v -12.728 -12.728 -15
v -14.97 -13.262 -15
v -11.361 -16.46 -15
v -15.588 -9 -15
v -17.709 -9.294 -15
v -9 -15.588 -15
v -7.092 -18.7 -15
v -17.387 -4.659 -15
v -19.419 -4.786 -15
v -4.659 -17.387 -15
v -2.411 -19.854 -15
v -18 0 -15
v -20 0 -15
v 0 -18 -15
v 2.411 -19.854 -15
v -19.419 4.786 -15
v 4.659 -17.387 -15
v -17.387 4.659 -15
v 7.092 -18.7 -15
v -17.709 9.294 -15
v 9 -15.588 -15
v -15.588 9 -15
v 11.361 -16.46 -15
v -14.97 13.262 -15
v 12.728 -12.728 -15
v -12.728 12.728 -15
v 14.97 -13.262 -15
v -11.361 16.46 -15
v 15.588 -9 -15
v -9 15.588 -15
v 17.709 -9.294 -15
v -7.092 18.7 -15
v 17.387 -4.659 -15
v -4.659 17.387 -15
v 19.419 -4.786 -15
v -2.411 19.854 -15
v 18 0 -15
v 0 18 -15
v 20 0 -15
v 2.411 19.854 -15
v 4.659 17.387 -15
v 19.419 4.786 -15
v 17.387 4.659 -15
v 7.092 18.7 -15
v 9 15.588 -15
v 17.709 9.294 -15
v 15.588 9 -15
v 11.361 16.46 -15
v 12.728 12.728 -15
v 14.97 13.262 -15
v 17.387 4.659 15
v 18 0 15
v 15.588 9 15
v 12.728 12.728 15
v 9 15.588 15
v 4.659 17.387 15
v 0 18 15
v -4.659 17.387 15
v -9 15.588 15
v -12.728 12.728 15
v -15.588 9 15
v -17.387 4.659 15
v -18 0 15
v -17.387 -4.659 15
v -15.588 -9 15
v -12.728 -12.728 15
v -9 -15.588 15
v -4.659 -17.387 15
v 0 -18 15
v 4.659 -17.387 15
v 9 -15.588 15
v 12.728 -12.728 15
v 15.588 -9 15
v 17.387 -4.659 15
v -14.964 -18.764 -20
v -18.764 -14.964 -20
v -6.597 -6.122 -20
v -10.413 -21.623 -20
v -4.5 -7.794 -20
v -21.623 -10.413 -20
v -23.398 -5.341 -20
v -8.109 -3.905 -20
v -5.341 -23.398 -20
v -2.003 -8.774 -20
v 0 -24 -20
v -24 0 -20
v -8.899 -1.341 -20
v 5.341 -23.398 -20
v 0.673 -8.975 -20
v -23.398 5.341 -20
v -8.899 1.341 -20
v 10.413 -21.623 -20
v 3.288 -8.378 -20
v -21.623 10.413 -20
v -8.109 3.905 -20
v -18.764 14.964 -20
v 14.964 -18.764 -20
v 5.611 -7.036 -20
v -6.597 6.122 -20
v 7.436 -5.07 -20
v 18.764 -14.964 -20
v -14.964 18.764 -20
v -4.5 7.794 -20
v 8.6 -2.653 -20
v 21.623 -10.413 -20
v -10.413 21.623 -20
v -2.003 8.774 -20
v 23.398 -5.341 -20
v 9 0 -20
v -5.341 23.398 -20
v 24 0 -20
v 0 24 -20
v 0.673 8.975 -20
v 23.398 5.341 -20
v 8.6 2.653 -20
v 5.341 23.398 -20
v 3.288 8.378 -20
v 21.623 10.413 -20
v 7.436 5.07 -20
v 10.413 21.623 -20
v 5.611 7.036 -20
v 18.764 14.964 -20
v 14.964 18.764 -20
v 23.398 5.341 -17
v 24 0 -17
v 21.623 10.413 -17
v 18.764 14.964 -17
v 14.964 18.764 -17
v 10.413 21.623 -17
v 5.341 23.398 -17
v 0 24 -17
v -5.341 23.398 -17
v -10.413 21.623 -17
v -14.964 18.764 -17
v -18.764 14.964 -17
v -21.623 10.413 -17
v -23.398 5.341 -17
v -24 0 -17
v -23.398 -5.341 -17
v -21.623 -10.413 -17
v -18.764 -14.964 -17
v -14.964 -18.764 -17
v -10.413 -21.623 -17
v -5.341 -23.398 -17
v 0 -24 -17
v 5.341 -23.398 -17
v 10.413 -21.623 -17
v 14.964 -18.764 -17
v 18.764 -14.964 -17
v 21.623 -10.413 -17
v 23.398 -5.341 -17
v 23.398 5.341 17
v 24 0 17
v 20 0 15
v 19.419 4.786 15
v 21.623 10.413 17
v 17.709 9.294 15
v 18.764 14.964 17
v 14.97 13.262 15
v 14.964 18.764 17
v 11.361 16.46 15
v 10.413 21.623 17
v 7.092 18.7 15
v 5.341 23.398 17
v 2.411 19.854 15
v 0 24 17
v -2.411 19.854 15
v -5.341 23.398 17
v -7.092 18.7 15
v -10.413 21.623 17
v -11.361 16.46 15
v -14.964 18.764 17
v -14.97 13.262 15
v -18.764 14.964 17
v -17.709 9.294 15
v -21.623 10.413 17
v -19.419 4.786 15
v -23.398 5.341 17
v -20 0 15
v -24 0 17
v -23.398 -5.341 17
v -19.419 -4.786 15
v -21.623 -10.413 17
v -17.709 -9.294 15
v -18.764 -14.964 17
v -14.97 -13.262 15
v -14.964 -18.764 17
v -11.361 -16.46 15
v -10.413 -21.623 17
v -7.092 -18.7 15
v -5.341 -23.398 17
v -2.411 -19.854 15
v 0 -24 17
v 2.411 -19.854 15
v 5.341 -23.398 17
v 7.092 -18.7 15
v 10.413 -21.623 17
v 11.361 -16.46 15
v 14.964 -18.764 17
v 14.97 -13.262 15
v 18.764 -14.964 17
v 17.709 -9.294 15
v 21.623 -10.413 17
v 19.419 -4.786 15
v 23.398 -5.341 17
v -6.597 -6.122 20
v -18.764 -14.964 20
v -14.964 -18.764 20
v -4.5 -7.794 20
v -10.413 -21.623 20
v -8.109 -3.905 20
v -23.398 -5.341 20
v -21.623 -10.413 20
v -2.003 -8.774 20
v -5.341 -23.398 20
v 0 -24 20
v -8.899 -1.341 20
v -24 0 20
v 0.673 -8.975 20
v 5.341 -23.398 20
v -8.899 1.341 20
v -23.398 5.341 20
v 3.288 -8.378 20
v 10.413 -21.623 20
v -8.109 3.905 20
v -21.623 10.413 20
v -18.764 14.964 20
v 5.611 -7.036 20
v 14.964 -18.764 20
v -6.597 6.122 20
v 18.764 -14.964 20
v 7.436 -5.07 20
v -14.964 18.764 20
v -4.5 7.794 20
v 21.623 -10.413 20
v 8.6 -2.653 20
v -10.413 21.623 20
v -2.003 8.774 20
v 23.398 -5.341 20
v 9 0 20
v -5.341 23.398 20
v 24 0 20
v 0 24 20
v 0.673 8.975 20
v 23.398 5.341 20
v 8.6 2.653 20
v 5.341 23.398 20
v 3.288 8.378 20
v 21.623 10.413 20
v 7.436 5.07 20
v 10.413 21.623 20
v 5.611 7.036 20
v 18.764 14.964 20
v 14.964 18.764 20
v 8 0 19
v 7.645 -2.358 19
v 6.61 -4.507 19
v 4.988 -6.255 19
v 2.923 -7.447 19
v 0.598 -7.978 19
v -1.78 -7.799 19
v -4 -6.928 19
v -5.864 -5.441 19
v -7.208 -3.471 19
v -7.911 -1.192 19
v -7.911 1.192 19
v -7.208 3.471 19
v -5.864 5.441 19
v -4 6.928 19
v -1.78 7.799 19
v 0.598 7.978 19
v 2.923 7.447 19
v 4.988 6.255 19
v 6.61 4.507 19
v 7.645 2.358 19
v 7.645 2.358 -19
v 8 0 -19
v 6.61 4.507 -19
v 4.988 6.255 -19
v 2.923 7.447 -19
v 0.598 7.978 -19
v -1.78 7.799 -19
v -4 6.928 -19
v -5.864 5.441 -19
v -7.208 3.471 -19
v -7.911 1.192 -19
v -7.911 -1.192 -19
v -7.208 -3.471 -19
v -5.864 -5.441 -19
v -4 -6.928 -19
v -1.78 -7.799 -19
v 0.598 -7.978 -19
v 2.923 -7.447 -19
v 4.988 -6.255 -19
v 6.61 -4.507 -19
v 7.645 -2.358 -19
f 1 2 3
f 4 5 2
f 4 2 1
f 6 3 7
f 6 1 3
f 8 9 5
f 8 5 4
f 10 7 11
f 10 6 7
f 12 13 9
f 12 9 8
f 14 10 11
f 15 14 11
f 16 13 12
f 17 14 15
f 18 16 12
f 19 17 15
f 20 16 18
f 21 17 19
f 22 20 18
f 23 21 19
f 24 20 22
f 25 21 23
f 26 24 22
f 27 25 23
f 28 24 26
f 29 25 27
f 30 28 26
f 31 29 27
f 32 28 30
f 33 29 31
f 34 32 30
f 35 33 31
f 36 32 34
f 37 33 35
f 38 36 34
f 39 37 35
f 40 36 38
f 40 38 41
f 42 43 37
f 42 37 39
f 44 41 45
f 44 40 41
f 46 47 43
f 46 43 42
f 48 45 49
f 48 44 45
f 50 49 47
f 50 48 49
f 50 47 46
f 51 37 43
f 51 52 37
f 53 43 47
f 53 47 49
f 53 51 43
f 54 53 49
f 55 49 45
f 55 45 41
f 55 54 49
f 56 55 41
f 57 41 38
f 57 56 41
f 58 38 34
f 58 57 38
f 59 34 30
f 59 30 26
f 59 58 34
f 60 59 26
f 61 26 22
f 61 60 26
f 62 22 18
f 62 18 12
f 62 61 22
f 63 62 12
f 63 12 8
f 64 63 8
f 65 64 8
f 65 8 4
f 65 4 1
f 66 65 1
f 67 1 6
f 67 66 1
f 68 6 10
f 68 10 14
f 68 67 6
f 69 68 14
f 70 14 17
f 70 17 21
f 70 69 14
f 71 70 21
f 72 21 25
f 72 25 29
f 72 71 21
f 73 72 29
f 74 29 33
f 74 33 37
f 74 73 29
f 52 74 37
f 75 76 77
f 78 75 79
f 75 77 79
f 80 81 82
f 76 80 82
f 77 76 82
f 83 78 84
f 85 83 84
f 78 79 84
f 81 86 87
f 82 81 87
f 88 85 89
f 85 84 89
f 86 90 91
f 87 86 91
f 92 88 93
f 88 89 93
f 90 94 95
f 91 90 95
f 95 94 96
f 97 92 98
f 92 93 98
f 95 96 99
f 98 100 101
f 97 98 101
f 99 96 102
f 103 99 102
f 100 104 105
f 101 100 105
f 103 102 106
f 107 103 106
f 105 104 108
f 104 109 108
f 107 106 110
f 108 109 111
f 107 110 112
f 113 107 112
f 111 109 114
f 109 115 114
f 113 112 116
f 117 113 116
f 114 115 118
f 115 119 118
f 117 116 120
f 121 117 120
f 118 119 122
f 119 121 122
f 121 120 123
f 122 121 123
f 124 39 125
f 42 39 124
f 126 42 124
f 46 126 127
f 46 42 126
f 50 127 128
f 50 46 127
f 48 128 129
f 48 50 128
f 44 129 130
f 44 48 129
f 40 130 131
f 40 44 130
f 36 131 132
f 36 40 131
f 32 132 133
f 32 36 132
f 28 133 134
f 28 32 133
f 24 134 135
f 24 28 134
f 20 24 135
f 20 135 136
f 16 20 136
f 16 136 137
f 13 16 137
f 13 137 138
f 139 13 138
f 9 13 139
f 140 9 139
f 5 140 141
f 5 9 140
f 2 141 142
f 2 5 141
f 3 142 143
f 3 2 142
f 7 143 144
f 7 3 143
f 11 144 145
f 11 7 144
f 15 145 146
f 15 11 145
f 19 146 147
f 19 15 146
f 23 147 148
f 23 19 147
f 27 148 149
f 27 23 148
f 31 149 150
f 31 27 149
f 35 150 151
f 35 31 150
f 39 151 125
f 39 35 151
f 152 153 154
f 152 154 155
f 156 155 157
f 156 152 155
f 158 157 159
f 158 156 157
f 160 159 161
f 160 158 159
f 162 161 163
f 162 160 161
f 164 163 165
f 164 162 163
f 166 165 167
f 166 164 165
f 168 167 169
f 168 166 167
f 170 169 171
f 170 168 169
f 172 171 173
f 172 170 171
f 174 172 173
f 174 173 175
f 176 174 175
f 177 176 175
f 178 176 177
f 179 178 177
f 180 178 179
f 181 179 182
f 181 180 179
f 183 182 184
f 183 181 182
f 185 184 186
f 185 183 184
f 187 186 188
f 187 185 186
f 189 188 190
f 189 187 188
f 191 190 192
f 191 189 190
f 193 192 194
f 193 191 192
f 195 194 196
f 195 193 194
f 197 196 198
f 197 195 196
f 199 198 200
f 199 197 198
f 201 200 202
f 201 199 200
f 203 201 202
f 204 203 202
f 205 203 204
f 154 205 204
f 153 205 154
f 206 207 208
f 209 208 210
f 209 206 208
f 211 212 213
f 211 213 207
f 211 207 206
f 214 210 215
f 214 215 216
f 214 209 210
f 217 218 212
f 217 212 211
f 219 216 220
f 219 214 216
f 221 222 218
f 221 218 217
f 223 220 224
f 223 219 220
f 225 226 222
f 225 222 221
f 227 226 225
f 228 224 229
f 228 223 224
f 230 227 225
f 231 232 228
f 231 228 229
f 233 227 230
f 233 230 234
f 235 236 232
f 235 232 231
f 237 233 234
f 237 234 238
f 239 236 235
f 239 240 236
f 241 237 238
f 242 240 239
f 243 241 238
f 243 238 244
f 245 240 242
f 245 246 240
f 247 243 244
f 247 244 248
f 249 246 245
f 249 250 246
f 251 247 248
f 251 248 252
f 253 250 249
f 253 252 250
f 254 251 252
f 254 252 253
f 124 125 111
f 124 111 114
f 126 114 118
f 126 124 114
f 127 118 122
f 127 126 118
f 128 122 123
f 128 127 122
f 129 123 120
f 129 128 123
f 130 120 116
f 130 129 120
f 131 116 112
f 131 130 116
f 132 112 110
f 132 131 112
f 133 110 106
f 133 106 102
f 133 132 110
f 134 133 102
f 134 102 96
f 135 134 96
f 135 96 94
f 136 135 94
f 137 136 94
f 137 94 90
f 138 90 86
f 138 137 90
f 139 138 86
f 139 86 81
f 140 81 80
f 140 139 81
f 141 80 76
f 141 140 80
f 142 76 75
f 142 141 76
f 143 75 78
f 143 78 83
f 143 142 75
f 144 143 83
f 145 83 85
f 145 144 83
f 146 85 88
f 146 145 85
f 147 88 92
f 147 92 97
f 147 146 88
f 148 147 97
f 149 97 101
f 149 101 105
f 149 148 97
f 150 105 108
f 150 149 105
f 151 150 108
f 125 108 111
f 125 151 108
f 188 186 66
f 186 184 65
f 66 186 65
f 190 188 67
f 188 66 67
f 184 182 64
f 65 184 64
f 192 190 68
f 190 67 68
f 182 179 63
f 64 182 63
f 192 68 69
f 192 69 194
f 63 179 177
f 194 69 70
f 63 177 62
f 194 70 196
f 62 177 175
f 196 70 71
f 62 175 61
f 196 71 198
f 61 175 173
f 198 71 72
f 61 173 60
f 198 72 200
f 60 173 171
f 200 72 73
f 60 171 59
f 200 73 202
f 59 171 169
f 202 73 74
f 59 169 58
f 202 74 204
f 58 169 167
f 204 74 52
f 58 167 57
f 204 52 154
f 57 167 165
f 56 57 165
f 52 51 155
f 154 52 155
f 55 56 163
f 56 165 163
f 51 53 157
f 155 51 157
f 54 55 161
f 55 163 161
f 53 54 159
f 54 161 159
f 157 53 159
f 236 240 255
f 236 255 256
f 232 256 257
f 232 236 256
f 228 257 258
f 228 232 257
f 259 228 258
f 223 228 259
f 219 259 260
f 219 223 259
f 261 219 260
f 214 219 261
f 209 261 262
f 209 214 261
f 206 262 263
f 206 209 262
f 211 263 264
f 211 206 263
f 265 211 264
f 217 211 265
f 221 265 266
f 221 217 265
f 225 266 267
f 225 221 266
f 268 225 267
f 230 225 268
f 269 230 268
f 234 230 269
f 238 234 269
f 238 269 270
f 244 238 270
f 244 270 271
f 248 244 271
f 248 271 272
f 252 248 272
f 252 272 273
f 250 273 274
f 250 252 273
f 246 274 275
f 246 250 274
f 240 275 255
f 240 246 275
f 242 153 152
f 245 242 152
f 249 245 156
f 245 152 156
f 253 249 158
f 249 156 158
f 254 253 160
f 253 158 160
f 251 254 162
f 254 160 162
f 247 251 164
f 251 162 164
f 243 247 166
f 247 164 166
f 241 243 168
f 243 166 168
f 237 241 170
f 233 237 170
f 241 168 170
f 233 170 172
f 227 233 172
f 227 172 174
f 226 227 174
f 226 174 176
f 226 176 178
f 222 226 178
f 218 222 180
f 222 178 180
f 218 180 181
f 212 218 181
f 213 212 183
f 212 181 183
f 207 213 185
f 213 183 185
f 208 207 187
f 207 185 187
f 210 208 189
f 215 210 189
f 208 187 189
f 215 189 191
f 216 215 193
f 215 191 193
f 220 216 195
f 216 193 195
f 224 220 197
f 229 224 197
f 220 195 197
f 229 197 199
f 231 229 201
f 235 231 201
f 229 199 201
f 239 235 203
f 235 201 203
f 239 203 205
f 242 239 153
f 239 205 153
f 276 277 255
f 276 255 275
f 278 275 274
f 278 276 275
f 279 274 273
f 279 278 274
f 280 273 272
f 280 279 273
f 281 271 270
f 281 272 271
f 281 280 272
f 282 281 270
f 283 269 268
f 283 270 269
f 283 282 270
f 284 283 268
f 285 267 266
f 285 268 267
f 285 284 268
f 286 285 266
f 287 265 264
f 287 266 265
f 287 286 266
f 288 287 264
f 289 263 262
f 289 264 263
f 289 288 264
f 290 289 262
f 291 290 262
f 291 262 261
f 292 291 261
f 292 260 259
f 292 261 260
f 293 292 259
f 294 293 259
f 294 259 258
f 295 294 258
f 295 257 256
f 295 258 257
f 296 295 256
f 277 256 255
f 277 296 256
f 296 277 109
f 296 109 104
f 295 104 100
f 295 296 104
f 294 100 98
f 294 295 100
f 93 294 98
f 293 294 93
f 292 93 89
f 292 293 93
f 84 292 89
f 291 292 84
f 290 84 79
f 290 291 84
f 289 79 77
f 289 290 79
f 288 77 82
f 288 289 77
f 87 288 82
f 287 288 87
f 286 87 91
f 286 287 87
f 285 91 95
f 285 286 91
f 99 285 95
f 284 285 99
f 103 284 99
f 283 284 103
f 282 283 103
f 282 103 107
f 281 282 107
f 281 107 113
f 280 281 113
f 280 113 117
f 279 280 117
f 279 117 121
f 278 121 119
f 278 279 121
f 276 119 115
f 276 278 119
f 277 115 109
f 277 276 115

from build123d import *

# Parameters (mm, degrees)
SKETCH1_R                 = 18
EXTRUDE1_DEPTH            = 15
SKETCH2_R                 = 24
EXTRUDE2_DEPTH            = 5
CHAMFER2_SIZE             = 4
CHAMFER2_SIZE2            = 2
CHAMFER2_OF_MIRROR2_SIZE2 = 4
CHAMFER2_OF_MIRROR2_SIZE  = 2
EXTRUDE3_DEPTH            = 40.395431207
EXTRUDE3_DEPTH_BACK       = 40.395431207
SKETCH3_R                 = 8
CHAMFER3_SIZE             = 1


with BuildPart() as part:
    # Sketch1 → Extrude1 (new, symmetric)
    with BuildSketch(Plane.XY):
        Circle(SKETCH1_R)
    extrude(amount=EXTRUDE1_DEPTH, both=True)

    # Sketch2 → Extrude2 (add)
    with BuildSketch(Plane.XY.offset(15)):
        Circle(SKETCH2_R)
    extrude2 = extrude(amount=EXTRUDE2_DEPTH)

    # Chamfer2
    chamfer2_edges = [part.edges().sort_by_distance(p)[0] for p in [
        (-24, 0, 15),
    ]]
    chamfer2_side = [part.faces().sort_by_distance(p)[0] for p in [
        (-23.32117749, 0, 15),
    ]]
    chamfer(chamfer2_edges, length=CHAMFER2_SIZE, length2=CHAMFER2_SIZE2, reference=chamfer2_side[0])

    # Mirror2: Extrude2 across plane
    add(extrude2.mirror(Plane.XY))

    # Chamfer2 of Mirror2
    chamfer2_of_mirror2_edges = [part.edges().sort_by_distance(p)[0] for p in [
        (-24, 0, -15),
    ]]
    chamfer(chamfer2_of_mirror2_edges, length=CHAMFER2_OF_MIRROR2_SIZE, length2=CHAMFER2_OF_MIRROR2_SIZE2)

    # Sketch3 → Extrude3 (cut, two sides: drawn at the far end of the back side and taken through both)
    with BuildSketch(Plane.XY.offset(-EXTRUDE3_DEPTH_BACK)):
        Circle(SKETCH3_R)
    extrude(amount=EXTRUDE3_DEPTH + EXTRUDE3_DEPTH_BACK, mode=Mode.SUBTRACT)

    # Chamfer3
    chamfer3_edges = [part.edges().sort_by_distance(p)[0] for p in [
        (-8, 0, -20),
        (-8, 0, 20),
    ]]
    chamfer(chamfer3_edges, length=CHAMFER3_SIZE)


solid = part.part
